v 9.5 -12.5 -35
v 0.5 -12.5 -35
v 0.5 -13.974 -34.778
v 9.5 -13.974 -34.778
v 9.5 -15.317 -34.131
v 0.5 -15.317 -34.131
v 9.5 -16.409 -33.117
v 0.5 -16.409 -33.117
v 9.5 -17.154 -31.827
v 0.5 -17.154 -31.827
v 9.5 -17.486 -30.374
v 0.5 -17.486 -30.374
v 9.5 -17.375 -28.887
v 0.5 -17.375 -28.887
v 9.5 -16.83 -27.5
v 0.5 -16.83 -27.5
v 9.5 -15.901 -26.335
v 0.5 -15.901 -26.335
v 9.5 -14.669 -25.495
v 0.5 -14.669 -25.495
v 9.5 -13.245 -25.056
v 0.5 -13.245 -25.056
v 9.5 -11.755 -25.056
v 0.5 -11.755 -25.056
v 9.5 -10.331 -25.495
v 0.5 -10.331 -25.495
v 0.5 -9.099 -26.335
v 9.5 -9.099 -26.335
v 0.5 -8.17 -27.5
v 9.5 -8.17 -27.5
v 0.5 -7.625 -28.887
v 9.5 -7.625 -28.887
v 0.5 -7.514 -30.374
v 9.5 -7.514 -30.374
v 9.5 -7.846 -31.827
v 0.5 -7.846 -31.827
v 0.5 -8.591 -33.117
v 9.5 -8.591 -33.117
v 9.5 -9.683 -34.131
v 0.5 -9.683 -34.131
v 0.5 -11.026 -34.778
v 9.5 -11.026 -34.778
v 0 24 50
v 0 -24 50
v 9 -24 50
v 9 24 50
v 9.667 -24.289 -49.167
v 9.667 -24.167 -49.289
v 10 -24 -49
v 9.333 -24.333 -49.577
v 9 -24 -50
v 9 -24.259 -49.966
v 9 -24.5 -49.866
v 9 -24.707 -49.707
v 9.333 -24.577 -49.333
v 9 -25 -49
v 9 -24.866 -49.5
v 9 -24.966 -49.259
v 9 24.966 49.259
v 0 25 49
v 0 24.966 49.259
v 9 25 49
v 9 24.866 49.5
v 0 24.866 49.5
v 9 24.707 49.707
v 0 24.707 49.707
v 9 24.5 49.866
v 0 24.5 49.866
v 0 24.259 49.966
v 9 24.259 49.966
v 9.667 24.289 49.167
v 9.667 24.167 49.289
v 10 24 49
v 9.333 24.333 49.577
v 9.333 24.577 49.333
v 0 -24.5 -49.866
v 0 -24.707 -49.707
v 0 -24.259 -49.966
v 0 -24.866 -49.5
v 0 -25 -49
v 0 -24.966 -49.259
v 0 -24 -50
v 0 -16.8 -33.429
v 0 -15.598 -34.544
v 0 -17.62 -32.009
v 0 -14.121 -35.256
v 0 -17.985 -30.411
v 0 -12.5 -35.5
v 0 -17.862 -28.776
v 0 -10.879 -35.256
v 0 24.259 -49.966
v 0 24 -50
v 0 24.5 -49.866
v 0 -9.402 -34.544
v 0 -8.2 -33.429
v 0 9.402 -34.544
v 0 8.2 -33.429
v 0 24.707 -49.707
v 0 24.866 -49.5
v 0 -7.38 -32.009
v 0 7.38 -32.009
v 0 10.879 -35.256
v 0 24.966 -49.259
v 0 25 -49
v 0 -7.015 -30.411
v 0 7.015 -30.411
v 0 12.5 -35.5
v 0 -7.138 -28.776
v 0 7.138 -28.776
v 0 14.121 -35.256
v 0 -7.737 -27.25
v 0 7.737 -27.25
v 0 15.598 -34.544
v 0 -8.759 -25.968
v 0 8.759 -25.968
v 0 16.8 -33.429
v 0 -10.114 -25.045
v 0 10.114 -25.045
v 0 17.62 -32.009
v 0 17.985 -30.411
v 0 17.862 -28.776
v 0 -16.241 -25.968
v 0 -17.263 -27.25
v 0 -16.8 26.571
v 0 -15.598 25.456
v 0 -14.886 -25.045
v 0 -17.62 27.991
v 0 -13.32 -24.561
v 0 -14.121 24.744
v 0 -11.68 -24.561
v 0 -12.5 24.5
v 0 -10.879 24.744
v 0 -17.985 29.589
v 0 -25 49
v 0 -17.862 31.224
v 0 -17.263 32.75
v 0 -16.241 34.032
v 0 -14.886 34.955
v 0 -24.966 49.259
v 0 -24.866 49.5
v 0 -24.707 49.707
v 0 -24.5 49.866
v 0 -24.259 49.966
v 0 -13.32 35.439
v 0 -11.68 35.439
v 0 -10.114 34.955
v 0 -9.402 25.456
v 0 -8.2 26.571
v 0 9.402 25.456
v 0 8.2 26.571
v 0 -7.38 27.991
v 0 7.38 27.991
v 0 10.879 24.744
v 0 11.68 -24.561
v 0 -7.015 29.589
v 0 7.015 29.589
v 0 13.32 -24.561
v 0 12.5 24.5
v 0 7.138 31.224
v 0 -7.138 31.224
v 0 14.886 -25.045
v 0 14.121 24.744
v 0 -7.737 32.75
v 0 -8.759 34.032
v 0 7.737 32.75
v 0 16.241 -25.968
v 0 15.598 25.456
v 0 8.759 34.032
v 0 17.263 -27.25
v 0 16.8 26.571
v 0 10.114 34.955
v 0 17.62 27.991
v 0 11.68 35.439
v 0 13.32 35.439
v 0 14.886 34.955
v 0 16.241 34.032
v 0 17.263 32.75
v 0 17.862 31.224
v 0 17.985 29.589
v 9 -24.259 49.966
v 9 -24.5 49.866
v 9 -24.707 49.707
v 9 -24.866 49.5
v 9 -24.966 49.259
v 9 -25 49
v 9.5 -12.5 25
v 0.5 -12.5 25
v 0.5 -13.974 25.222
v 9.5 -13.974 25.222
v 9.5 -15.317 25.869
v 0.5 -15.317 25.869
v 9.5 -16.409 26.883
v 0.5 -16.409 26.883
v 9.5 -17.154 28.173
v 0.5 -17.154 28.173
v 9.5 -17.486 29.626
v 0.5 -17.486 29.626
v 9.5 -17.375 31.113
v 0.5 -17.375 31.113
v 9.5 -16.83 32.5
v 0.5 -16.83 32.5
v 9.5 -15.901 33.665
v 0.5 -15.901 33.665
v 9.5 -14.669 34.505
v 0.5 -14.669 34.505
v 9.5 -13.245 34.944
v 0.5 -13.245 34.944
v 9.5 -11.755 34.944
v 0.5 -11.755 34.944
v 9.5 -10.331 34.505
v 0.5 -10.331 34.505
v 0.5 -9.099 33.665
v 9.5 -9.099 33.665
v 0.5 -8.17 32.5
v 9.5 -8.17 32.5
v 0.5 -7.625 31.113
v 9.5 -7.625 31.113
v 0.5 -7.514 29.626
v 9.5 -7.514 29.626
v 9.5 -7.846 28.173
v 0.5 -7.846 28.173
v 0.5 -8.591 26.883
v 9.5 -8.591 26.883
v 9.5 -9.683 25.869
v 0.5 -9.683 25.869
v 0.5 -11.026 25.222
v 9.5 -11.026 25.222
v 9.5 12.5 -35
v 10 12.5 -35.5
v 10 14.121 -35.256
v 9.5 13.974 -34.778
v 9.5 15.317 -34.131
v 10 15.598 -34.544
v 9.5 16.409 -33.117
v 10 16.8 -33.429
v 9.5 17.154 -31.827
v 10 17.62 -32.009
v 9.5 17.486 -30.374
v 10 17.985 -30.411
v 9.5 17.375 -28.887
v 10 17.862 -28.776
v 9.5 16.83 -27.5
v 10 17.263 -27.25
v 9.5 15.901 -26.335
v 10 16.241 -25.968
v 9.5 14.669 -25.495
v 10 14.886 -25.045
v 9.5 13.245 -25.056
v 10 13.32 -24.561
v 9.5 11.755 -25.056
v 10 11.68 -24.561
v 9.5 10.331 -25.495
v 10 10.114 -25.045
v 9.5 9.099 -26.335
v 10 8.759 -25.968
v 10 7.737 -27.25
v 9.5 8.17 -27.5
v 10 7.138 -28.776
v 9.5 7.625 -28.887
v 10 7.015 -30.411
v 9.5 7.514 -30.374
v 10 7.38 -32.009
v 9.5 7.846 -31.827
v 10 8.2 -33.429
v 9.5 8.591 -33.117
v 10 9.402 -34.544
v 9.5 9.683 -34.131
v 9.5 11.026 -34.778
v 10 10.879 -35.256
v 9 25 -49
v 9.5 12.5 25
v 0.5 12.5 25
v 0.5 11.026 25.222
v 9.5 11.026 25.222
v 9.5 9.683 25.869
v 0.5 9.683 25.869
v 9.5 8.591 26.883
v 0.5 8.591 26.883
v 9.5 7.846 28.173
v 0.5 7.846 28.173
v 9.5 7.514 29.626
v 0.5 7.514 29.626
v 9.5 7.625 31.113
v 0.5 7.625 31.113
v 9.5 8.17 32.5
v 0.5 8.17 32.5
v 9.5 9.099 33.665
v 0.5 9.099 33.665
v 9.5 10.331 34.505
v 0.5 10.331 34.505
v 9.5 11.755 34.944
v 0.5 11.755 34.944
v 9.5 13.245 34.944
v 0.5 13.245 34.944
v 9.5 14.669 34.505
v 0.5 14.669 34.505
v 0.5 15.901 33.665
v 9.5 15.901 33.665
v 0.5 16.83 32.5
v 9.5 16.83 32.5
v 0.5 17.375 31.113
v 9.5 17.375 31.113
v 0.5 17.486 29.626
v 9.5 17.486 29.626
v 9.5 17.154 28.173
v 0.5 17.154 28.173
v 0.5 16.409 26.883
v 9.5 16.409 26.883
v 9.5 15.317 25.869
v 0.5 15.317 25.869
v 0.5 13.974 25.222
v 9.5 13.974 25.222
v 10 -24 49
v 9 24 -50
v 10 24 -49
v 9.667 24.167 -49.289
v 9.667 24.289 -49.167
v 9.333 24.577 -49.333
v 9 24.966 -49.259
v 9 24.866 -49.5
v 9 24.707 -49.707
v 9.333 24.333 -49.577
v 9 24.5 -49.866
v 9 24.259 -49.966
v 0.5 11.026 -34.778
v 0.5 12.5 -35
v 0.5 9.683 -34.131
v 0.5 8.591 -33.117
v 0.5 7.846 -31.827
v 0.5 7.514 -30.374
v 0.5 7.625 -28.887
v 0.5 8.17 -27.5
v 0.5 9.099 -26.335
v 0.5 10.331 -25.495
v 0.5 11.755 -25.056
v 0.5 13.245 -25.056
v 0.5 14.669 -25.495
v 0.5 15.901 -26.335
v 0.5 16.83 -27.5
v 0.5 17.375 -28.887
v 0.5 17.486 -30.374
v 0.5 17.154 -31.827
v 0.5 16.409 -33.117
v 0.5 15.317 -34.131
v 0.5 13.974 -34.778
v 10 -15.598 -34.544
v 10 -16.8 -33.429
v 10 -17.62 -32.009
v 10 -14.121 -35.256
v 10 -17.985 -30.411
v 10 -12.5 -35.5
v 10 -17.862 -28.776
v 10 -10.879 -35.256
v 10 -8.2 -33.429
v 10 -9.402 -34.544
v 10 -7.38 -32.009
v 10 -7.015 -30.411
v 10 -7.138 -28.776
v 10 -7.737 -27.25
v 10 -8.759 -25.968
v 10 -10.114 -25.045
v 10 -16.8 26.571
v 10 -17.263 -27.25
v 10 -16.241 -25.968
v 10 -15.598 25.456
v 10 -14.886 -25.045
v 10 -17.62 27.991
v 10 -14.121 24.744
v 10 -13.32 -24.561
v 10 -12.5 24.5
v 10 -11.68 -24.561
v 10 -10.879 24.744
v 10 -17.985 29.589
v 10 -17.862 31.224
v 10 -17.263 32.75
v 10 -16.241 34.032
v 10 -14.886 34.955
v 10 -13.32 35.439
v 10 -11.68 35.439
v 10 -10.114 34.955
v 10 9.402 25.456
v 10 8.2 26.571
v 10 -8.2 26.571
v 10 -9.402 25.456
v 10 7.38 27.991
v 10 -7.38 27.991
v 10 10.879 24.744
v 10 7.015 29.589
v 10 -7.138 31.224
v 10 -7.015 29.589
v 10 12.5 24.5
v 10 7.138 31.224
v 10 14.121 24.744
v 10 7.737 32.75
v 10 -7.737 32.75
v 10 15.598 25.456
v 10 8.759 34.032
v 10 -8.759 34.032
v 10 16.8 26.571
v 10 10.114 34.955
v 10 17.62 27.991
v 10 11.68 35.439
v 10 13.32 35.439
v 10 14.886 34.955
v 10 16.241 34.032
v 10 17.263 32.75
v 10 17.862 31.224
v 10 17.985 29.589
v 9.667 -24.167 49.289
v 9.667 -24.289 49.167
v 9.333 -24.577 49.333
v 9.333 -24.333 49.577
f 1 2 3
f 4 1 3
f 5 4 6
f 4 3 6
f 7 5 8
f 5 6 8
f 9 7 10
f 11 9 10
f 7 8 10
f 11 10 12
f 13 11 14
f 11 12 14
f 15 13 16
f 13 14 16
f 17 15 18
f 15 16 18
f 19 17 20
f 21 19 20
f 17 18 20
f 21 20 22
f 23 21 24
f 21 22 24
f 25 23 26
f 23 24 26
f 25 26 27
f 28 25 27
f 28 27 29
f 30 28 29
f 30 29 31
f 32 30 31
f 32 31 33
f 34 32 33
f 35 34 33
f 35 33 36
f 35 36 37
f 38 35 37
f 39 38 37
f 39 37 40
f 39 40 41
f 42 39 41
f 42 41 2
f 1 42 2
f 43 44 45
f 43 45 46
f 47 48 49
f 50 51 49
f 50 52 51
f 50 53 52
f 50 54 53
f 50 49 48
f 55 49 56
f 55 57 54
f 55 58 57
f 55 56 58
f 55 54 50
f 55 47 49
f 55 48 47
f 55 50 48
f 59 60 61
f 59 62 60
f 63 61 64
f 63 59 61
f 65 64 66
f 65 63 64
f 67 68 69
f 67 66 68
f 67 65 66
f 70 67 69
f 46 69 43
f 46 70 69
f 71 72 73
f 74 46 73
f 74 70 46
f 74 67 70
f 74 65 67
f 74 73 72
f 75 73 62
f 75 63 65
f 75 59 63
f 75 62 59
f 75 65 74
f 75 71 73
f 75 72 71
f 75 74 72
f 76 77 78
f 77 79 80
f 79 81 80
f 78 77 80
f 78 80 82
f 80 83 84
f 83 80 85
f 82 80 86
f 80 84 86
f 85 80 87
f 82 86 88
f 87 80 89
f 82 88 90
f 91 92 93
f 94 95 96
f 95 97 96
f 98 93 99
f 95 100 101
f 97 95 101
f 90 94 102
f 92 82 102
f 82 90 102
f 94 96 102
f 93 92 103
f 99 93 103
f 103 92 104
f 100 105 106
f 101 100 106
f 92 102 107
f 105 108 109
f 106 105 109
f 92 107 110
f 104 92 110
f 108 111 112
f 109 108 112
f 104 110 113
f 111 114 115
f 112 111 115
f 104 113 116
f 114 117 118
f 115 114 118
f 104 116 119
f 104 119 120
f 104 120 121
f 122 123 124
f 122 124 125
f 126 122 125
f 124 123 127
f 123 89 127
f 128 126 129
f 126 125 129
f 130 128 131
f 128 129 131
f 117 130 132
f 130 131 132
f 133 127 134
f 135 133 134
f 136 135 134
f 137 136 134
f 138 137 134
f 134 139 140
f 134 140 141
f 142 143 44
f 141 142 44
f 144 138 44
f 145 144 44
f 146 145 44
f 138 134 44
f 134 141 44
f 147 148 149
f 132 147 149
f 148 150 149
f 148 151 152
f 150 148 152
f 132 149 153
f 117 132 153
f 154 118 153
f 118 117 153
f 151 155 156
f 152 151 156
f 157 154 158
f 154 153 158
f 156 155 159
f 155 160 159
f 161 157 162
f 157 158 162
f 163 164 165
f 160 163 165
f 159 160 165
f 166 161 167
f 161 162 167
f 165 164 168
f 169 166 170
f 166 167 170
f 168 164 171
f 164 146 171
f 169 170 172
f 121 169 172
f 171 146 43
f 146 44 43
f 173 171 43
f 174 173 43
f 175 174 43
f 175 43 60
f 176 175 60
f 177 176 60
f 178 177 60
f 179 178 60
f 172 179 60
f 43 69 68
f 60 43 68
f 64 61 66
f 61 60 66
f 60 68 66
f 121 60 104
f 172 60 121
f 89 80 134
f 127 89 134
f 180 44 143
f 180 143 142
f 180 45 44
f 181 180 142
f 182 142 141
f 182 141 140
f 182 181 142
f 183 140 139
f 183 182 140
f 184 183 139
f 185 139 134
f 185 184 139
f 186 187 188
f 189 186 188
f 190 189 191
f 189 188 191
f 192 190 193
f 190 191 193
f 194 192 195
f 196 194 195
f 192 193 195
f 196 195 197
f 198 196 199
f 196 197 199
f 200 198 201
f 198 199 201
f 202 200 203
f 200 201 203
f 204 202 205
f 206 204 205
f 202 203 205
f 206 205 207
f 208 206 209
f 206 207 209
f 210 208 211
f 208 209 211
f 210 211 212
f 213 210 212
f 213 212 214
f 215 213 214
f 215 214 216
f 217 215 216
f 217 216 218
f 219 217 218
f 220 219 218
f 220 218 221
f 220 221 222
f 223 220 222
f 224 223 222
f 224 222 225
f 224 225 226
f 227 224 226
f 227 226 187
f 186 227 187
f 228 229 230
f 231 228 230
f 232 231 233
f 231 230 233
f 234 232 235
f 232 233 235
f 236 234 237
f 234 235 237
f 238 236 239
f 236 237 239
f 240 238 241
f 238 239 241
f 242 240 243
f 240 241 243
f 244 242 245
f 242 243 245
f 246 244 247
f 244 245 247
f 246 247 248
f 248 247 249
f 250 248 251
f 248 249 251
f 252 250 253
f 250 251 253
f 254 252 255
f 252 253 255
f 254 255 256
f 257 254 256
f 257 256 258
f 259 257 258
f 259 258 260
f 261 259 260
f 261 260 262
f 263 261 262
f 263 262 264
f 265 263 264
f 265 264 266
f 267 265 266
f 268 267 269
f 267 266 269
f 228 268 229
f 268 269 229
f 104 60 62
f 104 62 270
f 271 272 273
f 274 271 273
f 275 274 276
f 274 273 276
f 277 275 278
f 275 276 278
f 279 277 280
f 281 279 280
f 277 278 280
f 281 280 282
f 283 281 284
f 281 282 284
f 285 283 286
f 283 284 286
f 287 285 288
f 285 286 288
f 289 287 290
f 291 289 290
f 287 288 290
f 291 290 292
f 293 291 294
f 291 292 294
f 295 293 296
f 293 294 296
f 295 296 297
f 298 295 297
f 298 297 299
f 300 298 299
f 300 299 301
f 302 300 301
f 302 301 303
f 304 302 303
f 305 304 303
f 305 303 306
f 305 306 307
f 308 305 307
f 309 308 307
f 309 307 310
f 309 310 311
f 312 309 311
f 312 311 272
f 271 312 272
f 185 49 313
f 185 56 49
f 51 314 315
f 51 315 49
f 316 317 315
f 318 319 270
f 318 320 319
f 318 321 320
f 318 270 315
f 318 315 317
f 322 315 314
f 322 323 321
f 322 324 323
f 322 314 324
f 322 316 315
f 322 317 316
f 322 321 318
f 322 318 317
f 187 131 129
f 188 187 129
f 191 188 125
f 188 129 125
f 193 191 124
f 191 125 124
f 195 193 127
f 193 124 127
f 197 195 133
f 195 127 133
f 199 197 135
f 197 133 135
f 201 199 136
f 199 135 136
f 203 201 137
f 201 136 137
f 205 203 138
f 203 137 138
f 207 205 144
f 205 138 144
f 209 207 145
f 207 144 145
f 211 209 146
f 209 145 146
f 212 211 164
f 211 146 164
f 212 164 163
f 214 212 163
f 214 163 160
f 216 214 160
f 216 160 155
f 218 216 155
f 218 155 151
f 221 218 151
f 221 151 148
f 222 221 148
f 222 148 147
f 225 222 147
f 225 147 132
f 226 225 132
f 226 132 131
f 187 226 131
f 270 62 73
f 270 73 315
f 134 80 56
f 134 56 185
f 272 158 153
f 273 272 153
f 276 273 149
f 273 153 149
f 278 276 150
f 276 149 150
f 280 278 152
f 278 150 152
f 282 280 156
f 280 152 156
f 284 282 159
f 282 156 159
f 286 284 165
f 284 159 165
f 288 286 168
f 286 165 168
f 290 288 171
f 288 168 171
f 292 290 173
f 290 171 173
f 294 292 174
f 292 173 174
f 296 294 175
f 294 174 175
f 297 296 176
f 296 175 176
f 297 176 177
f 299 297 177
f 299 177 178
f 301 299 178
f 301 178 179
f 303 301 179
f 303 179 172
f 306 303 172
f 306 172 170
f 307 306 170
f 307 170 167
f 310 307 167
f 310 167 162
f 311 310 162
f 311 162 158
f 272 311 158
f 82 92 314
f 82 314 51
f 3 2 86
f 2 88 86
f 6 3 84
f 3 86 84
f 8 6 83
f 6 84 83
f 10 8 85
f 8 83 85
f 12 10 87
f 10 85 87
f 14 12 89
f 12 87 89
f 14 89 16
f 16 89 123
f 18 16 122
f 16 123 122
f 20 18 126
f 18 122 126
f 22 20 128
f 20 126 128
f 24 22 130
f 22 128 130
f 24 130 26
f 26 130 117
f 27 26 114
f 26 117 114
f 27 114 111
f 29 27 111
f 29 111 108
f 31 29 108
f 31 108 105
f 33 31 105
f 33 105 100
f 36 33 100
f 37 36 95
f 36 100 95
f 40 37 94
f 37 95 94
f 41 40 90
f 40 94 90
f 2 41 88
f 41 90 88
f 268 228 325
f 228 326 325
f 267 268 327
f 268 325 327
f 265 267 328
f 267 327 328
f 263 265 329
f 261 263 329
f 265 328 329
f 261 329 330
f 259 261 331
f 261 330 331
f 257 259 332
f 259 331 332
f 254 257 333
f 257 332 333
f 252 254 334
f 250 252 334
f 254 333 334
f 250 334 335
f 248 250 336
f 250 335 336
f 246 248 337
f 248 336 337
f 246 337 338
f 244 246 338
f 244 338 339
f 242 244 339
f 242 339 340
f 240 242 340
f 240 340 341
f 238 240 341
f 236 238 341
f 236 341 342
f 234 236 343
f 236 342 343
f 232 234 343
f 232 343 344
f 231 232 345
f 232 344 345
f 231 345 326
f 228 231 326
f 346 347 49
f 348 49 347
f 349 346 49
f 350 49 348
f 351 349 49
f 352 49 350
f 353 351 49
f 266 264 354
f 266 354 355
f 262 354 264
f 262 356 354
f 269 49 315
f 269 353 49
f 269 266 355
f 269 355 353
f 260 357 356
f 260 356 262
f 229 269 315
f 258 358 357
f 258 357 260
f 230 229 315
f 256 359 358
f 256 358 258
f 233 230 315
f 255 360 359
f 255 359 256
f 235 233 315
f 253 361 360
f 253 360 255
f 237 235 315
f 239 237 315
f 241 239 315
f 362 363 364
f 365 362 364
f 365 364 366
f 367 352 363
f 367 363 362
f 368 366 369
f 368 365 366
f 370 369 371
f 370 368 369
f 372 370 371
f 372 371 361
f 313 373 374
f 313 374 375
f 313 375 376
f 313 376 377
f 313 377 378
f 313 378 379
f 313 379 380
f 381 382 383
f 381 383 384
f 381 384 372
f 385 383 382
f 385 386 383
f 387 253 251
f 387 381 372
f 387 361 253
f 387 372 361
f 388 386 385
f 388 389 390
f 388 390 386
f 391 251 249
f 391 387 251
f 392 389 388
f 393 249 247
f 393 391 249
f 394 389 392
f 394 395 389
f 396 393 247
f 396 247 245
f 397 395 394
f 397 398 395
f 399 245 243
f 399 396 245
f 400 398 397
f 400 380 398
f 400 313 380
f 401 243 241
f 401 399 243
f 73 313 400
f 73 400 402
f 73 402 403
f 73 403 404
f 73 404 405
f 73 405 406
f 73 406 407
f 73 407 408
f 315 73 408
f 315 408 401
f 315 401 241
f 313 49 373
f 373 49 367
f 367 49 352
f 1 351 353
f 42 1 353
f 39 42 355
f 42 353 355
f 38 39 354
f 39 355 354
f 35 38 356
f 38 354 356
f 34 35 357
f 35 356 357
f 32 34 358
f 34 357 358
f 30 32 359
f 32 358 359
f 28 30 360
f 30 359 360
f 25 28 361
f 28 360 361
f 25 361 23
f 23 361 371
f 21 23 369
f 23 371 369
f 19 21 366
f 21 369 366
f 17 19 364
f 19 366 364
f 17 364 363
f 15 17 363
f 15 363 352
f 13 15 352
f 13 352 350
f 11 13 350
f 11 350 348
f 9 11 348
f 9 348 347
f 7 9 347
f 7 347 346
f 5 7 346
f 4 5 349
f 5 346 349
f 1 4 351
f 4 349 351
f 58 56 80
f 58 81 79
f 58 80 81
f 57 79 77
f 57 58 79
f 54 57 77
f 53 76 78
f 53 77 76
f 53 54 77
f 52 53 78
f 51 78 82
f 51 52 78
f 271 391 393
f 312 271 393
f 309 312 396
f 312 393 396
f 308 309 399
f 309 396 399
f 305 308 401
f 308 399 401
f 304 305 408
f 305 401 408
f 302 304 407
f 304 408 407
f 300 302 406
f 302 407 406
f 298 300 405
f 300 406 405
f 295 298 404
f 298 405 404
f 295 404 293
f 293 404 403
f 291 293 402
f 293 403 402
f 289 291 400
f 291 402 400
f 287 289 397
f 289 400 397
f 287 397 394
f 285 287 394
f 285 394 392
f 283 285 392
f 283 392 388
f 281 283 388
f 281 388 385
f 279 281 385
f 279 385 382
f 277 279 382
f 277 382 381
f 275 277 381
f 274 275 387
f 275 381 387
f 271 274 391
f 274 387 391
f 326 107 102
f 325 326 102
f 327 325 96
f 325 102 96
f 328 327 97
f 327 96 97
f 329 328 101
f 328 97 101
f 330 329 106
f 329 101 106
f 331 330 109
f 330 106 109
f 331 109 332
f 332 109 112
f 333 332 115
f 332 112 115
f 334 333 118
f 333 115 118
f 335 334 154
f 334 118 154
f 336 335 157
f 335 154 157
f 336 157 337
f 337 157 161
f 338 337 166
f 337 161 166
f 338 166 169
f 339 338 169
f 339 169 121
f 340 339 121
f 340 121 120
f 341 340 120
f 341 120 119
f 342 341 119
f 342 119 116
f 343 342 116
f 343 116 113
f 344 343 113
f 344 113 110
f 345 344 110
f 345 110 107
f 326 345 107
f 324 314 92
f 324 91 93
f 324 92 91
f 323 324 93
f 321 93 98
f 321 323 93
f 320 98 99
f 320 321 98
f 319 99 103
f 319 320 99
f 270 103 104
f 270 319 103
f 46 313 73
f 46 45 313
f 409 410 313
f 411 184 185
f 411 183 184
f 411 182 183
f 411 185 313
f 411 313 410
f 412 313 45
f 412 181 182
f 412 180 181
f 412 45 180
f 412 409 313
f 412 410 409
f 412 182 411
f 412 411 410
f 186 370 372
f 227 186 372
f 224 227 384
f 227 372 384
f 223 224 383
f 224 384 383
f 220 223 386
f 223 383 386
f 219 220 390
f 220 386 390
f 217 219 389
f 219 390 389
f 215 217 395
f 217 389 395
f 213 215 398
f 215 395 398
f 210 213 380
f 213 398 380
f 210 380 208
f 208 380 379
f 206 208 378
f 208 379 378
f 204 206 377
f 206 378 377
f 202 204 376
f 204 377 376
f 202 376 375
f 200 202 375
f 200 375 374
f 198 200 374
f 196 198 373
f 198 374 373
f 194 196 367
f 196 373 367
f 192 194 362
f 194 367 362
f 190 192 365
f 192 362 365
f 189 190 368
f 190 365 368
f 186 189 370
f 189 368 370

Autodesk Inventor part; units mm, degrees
ref_plane "YZ Plane" through (0, 0, 0) normal (1, 0, 0) x (0, 1, 0)
ref_plane "XZ Plane" through (0, 0, 0) normal (0, 1, 0) x (-1, 0, 0)
ref_plane "XY Plane" through (0, 0, 0) normal (0, 0, 1) x (1, 0, 0)
sketch "草圖1" plane through (0, 0, 0) normal (1, 0, 0) x (0, 1, 0)
  line L0 (-25, 50) -> (25, 50)
  line L1 (25, 50) -> (25, -50)
  line L2 (25, -50) -> (-25, -50)
  line L3 (-25, -50) -> (-25, 50)
  line L4 (-25, 50) -> (25, -50) construction
  line L5 (25, 50) -> (-25, -50) construction
  point P0 (0, 0)
  dimension "d0" = 50
  dimension "d1" = 100
extrude "擠出1" add sketch "草圖1" along normal blind 10
fillet "圓角1" radius 1 4 edges at (5, 25, 50) (5, -25, 50) (5, 25, -50) (5, -25, -50)
chamfer "倒角1" distance 1 angle 45 8 edges at (10, -25, 0) (10, -24.7071, -49.7071) (10, 0, -50) (10, 24.7071, -49.7071) (10, 25, 0) (10, 24.7071, 49.7071) (10, 0, 50) (10, -24.7071, 49.7071)
sketch "草圖2" plane through (10, 0, 0) normal (1, 0, 0) x (0, 0, -1)
  line L0 (-50, 24) -> (-50, -24) projected
  line L1 (49, 25) -> (-49, 25) projected
  line L2 (-30, 24) -> (-30, -24)
  line L3 (50, -24) -> (50, 24) projected
  line L4 (30, -24) -> (30, 24)
  line L5 (30, -12.5) -> (-30, -12.5)
  line L6 (-30, -12.5) -> (-30, 12.5)
  line L7 (-30, 12.5) -> (30, 12.5)
  line L8 (30, 12.5) -> (30, -12.5)
  line L9 (30, -12.5) -> (-30, 12.5) construction
  line L10 (-30, -12.5) -> (30, 12.5) construction
  point P0 (0, 0)
  dimension "d8" = 20
  dimension "d9" = 20
  dimension "d10" = 25
hole "孔1" at (10, 12.5, 30) at (10, -12.5, 30) at (10, 12.5, -30) at (10, -12.5, -30) direction (-1, 0, 0) diameter 10 end through all
thread "螺紋1" size "M10x1.25" class "6H" standard "ANSI Metric M Profile" full length
thread "螺紋2" size "M10x1.5" class "6H" standard "ANSI Metric M Profile" full length
chamfer "倒角2" distance 0.5 angle 45 8 edges at (10, -12.5, -25) (10, 12.5, -25) (10, -12.5, 35) (10, 12.5, 35) (0, -12.5, -25) (0, 12.5, -25) (0, -12.5, 35) (0, 12.5, 35)
properties part number "exercise3-3"
